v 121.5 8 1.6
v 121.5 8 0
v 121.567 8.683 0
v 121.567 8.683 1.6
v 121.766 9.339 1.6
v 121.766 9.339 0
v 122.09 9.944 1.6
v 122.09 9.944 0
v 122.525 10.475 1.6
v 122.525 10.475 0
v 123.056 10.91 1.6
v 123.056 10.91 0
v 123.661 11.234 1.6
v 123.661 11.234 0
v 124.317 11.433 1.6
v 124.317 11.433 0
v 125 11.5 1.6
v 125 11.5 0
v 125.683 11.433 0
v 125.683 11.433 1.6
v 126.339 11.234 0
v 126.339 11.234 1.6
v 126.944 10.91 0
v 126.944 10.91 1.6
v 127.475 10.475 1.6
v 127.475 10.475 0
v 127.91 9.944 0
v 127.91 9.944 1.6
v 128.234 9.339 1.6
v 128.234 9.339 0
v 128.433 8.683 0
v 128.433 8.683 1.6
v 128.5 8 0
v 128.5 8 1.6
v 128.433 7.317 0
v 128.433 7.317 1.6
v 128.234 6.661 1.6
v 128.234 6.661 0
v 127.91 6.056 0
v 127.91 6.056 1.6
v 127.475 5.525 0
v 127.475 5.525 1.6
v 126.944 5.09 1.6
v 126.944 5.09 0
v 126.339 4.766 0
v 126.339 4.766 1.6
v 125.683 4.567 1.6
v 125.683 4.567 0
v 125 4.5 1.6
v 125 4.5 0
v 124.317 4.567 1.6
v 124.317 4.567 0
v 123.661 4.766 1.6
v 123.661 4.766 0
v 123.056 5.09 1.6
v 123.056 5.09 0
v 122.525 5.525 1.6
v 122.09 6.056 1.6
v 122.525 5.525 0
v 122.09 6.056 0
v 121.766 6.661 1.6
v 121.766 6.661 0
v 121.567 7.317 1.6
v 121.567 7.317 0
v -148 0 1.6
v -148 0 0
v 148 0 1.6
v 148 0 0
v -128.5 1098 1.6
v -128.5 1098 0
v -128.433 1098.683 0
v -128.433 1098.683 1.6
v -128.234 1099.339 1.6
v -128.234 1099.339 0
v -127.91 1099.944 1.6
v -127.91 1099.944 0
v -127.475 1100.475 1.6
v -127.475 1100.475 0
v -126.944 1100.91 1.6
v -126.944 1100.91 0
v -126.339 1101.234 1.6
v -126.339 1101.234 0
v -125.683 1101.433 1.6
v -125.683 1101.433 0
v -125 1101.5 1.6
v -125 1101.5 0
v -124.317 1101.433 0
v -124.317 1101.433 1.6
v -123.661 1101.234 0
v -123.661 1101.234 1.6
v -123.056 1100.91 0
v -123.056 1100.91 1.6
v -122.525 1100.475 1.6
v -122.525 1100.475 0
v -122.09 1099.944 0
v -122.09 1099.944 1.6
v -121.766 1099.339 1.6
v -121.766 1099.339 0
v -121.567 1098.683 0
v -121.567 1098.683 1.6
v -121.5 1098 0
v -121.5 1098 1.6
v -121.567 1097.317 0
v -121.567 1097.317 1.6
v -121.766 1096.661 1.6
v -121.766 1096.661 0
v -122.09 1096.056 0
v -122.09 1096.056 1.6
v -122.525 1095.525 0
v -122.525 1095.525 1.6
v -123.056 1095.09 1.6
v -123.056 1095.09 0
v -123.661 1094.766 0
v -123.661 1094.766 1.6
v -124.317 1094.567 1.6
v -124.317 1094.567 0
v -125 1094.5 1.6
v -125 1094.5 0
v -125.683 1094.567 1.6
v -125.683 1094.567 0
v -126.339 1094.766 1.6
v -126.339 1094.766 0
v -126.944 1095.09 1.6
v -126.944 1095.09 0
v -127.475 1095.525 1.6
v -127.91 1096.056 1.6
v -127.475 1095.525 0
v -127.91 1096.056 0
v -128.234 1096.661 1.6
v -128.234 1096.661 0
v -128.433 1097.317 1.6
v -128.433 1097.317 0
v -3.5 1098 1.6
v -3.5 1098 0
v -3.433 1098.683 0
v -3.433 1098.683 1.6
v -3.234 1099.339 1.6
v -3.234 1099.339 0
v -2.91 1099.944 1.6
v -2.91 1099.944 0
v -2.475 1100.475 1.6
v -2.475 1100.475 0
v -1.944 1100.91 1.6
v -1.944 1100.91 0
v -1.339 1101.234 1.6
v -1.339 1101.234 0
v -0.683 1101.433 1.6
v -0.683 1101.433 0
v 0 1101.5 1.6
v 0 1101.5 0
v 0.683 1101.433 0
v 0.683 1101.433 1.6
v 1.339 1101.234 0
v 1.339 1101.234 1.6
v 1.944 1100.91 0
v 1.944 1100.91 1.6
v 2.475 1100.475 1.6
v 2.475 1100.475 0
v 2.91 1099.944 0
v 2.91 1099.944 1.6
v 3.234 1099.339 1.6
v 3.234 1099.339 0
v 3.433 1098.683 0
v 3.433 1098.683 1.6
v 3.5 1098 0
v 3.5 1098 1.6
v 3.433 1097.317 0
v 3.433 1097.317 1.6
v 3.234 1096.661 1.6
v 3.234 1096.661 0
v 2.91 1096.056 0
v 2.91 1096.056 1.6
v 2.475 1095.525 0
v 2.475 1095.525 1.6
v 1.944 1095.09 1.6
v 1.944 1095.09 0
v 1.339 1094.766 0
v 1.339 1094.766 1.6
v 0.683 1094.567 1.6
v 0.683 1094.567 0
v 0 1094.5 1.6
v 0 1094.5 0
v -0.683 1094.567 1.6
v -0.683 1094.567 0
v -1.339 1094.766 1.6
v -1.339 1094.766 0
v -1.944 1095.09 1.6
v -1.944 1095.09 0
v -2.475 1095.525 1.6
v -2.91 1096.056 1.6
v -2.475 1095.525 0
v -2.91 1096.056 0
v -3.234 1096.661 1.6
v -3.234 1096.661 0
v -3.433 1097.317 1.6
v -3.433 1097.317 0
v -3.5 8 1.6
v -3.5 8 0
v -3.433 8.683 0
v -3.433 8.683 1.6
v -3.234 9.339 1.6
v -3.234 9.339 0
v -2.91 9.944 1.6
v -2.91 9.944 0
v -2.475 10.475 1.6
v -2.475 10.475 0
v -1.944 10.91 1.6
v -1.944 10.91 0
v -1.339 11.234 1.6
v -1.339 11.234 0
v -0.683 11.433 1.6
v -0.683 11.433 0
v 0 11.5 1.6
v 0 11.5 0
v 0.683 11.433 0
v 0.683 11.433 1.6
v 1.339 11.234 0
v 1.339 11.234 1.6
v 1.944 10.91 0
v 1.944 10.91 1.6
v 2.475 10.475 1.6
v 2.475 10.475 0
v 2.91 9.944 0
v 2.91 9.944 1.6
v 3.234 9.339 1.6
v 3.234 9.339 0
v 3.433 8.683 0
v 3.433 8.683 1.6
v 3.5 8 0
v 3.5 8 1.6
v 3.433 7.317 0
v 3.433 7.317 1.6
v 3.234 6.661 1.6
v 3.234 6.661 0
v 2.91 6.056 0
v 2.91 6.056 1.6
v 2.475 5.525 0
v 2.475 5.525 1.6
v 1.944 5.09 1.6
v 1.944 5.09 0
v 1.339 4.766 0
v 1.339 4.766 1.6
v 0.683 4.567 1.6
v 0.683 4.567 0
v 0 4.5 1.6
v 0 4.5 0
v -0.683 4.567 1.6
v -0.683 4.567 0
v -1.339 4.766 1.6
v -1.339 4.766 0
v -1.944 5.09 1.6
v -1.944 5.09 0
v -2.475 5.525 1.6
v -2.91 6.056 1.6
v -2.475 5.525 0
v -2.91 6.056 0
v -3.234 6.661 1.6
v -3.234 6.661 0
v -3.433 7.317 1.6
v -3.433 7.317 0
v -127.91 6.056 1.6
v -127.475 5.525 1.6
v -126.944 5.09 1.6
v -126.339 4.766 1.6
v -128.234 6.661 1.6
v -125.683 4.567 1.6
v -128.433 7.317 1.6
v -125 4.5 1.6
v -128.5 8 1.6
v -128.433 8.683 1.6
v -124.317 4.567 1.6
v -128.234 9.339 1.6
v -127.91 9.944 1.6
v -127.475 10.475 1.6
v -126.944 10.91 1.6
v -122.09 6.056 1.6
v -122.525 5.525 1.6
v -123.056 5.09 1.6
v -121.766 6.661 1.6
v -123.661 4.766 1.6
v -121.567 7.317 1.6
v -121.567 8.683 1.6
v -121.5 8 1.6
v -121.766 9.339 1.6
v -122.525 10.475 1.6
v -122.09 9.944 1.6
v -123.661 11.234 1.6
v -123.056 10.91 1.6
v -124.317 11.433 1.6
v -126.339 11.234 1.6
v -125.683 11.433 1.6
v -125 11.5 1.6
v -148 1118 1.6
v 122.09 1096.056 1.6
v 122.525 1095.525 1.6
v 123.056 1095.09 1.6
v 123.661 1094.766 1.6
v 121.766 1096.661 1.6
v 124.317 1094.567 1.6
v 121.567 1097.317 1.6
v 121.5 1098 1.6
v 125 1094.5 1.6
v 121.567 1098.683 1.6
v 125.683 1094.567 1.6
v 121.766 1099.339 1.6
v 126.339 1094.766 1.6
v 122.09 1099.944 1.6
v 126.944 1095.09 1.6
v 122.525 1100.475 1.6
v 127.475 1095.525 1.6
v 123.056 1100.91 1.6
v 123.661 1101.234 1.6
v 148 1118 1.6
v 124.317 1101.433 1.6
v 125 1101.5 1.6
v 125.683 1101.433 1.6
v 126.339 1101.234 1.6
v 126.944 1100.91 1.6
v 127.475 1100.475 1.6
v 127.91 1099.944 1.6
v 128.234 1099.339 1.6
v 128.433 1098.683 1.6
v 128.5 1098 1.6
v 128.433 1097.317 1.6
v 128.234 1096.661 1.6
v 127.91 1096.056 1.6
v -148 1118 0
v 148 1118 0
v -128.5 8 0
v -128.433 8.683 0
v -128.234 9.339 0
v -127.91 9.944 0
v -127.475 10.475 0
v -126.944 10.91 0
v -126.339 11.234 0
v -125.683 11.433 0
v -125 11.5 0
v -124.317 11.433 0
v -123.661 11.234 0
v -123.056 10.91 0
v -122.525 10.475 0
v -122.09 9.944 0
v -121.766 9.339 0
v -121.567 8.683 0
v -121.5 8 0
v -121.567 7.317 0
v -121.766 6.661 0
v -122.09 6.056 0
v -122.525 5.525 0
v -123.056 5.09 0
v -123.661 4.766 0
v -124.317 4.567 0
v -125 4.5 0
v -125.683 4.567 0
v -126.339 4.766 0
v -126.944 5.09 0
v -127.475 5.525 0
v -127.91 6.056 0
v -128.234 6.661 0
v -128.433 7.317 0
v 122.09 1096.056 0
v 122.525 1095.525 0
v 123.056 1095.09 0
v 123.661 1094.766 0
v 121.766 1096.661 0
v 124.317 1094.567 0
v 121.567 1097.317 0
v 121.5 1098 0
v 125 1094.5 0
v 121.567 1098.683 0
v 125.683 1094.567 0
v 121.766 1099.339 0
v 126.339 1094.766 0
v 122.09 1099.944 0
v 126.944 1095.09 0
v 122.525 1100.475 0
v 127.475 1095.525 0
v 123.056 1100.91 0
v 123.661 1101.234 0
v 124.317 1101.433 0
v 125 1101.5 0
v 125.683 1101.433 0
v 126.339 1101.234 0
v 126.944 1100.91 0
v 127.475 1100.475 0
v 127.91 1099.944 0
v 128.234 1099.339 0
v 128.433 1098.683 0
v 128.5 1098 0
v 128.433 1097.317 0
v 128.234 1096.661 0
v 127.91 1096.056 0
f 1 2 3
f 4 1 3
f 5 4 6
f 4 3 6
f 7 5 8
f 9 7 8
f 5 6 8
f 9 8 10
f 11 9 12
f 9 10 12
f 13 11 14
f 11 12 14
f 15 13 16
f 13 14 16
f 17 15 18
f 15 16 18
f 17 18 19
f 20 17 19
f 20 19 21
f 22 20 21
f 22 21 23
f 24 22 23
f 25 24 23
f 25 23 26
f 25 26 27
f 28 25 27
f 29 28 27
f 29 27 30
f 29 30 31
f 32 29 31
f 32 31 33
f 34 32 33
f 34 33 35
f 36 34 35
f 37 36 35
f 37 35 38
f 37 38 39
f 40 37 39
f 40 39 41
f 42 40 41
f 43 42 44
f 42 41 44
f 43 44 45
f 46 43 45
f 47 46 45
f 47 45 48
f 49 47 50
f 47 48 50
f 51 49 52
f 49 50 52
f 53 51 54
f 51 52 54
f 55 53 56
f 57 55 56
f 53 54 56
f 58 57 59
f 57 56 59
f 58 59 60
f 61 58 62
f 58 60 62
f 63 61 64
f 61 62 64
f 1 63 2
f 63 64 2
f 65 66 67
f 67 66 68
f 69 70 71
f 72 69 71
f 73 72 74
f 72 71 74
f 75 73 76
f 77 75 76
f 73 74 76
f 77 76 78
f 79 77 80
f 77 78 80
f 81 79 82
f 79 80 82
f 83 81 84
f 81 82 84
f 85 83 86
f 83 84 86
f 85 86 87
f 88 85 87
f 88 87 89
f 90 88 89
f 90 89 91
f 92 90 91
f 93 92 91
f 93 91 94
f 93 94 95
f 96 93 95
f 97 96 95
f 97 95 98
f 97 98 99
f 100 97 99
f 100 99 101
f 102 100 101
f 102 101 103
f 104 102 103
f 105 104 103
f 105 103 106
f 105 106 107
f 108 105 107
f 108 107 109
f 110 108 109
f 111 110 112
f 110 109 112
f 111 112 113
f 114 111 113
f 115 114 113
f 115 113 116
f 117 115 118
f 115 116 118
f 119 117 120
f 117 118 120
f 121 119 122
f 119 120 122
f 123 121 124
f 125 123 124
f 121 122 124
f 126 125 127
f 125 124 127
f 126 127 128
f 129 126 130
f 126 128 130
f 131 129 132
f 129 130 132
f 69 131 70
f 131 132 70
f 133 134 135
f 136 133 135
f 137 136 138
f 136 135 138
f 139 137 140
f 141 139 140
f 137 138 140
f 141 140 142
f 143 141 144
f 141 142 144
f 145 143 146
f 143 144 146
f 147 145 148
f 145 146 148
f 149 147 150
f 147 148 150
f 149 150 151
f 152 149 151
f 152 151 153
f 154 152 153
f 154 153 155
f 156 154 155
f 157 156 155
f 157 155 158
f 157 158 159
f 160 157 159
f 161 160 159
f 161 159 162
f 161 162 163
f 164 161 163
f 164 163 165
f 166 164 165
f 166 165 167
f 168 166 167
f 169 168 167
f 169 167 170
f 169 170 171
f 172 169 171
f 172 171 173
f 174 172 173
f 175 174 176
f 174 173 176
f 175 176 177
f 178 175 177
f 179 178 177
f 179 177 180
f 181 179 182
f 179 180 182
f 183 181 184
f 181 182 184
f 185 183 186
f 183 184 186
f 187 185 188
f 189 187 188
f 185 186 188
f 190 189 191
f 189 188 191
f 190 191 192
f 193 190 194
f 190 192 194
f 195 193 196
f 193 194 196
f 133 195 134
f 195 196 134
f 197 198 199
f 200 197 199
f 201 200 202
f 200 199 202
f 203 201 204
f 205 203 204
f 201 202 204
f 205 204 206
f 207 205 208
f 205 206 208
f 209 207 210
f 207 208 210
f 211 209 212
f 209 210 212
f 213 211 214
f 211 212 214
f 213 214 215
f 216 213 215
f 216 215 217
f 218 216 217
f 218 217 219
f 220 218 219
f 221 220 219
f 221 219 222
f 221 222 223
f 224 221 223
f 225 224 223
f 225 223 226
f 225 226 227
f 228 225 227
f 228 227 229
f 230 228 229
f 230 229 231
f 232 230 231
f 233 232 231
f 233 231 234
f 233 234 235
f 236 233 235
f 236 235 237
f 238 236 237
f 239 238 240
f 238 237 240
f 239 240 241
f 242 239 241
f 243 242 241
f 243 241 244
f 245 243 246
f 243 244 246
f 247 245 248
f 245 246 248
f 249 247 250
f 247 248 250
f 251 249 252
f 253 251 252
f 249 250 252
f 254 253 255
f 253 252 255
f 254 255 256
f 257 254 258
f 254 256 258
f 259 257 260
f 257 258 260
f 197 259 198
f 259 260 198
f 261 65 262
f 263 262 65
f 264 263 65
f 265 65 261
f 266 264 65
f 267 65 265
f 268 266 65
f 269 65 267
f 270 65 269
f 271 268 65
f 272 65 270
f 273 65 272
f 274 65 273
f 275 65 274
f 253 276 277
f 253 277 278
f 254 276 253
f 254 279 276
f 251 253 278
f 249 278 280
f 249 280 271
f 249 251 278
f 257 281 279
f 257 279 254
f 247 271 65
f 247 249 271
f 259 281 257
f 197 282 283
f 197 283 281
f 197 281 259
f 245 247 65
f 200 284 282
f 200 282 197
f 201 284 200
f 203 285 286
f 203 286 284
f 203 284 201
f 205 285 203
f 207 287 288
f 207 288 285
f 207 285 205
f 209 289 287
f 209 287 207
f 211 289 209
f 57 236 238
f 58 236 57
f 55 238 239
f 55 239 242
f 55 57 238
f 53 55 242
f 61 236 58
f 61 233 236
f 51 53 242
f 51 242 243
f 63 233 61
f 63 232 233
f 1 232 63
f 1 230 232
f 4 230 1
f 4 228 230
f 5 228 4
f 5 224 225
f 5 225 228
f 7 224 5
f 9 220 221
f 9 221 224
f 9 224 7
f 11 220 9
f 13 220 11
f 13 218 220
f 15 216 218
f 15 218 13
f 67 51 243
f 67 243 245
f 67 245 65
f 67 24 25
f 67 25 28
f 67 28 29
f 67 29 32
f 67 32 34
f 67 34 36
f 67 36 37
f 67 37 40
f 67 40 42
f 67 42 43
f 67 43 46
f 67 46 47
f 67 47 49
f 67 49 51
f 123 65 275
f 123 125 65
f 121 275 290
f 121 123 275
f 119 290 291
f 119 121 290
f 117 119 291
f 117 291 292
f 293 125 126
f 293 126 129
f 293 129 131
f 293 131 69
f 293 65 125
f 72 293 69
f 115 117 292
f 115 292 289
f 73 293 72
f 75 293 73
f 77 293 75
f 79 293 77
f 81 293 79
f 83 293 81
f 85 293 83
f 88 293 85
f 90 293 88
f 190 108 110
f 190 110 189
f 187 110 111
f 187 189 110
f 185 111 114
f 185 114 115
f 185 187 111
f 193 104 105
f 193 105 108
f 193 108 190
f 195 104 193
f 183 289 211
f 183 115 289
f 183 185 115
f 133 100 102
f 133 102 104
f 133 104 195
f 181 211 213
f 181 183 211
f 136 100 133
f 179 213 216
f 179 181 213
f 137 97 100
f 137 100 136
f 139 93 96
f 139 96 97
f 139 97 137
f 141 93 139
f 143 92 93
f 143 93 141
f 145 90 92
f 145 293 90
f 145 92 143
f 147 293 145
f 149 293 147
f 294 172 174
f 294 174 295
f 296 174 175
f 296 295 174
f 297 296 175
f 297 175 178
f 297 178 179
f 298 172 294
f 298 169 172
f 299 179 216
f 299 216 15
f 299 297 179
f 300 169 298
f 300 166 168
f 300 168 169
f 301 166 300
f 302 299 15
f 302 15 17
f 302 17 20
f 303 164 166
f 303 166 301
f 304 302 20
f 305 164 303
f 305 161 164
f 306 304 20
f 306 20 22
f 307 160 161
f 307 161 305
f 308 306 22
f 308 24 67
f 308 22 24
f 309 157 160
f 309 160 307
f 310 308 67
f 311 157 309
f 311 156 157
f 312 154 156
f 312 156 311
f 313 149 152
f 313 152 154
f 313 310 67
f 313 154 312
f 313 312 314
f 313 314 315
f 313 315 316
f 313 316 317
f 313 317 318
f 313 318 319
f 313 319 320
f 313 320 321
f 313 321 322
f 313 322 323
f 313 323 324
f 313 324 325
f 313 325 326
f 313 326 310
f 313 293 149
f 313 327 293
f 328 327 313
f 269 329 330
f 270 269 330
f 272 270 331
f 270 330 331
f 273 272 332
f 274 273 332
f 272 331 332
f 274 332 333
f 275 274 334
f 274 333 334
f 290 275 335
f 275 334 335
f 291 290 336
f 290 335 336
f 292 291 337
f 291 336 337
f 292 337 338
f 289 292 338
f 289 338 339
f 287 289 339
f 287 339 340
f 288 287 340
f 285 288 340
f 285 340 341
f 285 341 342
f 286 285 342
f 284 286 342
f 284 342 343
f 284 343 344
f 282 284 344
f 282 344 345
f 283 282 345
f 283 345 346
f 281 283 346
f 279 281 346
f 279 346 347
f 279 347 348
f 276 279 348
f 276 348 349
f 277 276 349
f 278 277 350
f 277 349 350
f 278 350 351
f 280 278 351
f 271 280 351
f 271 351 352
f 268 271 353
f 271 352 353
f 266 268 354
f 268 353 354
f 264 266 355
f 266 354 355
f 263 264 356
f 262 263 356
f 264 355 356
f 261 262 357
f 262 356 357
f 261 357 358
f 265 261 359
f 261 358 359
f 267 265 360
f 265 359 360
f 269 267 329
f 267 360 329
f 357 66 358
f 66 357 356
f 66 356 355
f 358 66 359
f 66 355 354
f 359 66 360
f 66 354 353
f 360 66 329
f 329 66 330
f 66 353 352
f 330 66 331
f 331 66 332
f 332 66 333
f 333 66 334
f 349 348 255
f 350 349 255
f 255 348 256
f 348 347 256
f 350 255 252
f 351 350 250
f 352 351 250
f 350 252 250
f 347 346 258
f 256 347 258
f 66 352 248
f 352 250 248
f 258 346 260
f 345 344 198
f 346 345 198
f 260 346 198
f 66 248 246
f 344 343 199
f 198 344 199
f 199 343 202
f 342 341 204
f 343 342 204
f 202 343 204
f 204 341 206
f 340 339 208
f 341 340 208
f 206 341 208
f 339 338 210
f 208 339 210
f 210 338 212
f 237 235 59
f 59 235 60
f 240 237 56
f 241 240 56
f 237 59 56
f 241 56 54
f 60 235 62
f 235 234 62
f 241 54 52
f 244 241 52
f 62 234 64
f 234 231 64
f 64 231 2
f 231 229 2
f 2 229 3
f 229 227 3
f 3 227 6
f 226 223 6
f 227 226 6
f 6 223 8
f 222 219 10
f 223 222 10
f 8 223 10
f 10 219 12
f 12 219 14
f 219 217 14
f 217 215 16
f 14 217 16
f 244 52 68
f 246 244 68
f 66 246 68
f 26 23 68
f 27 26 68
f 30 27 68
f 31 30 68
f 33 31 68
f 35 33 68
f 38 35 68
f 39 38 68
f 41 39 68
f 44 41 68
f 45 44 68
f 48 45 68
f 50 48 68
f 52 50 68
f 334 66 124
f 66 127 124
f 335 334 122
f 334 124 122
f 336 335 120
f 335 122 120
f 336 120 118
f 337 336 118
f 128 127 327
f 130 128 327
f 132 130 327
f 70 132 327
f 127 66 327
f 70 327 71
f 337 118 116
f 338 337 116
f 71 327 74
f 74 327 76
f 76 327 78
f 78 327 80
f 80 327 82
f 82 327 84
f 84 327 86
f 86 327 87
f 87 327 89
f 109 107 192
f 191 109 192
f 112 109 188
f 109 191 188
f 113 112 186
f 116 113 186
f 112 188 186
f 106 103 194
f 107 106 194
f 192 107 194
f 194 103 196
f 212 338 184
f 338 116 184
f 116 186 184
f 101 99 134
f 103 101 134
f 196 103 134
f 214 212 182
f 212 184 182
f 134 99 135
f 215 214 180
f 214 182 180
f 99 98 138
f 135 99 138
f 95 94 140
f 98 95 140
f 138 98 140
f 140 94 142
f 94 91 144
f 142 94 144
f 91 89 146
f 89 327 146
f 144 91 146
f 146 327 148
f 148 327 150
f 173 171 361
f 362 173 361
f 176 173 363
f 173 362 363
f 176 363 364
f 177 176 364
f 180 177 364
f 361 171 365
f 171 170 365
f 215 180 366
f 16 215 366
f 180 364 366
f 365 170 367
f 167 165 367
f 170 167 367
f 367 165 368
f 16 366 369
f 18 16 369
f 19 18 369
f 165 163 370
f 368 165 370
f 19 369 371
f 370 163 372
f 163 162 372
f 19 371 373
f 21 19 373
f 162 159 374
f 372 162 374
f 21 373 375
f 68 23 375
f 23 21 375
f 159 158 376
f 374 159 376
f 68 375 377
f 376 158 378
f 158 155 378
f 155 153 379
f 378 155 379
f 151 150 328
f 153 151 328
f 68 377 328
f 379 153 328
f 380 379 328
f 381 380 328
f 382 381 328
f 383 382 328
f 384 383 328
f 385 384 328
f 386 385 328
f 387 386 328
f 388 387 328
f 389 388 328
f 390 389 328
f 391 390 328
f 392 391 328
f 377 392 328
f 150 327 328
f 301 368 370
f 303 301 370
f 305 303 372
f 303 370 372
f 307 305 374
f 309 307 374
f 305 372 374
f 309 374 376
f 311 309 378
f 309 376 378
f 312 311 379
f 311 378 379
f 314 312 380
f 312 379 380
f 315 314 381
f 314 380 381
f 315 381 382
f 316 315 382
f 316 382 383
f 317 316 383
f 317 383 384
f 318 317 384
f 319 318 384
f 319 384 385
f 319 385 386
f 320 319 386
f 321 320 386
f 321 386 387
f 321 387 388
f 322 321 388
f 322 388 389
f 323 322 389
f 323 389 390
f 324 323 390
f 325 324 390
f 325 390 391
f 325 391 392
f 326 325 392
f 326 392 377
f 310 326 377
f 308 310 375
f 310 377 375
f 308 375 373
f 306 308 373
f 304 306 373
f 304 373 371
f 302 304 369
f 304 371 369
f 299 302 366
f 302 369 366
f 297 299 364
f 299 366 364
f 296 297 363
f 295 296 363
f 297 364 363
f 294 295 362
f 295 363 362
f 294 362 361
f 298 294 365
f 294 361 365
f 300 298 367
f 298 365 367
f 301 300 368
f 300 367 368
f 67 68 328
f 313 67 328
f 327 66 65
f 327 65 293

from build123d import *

# Parameters (mm, degrees)
SKETCH1_W                = 296
SKETCH1_H                = 1118
BOSS_EXTRUDE1_DEPTH      = 1.6
F_7_0_7_DIAMETER_HOLE1_D = 7
LPATTERN1_COUNT          = 2
LPATTERN1_PITCH          = 1090


with BuildPart() as part:
    # Sketch1 → Boss-Extrude1 (new body)
    with BuildSketch(Plane.XY):
        with Locations((0, 559)):
            Rectangle(SKETCH1_W, SKETCH1_H)
    extrude(amount=BOSS_EXTRUDE1_DEPTH)

    # Ø7.0 (7) Diameter Hole1 (through all)
    with Locations(Plane.XY.offset(1.6)):
        with Locations((-125, 8), (0, 8), (125, 8)):
            f_7_0_7_diameter_hole1 = Hole(F_7_0_7_DIAMETER_HOLE1_D / 2)

    # LPattern1: Ø7.0 (7) Diameter Hole1 ×2
    with Locations(*[(0, i * LPATTERN1_PITCH, 0) for i in range(1, LPATTERN1_COUNT)]):
        add(f_7_0_7_diameter_hole1, mode=Mode.SUBTRACT)


solid = part.part
